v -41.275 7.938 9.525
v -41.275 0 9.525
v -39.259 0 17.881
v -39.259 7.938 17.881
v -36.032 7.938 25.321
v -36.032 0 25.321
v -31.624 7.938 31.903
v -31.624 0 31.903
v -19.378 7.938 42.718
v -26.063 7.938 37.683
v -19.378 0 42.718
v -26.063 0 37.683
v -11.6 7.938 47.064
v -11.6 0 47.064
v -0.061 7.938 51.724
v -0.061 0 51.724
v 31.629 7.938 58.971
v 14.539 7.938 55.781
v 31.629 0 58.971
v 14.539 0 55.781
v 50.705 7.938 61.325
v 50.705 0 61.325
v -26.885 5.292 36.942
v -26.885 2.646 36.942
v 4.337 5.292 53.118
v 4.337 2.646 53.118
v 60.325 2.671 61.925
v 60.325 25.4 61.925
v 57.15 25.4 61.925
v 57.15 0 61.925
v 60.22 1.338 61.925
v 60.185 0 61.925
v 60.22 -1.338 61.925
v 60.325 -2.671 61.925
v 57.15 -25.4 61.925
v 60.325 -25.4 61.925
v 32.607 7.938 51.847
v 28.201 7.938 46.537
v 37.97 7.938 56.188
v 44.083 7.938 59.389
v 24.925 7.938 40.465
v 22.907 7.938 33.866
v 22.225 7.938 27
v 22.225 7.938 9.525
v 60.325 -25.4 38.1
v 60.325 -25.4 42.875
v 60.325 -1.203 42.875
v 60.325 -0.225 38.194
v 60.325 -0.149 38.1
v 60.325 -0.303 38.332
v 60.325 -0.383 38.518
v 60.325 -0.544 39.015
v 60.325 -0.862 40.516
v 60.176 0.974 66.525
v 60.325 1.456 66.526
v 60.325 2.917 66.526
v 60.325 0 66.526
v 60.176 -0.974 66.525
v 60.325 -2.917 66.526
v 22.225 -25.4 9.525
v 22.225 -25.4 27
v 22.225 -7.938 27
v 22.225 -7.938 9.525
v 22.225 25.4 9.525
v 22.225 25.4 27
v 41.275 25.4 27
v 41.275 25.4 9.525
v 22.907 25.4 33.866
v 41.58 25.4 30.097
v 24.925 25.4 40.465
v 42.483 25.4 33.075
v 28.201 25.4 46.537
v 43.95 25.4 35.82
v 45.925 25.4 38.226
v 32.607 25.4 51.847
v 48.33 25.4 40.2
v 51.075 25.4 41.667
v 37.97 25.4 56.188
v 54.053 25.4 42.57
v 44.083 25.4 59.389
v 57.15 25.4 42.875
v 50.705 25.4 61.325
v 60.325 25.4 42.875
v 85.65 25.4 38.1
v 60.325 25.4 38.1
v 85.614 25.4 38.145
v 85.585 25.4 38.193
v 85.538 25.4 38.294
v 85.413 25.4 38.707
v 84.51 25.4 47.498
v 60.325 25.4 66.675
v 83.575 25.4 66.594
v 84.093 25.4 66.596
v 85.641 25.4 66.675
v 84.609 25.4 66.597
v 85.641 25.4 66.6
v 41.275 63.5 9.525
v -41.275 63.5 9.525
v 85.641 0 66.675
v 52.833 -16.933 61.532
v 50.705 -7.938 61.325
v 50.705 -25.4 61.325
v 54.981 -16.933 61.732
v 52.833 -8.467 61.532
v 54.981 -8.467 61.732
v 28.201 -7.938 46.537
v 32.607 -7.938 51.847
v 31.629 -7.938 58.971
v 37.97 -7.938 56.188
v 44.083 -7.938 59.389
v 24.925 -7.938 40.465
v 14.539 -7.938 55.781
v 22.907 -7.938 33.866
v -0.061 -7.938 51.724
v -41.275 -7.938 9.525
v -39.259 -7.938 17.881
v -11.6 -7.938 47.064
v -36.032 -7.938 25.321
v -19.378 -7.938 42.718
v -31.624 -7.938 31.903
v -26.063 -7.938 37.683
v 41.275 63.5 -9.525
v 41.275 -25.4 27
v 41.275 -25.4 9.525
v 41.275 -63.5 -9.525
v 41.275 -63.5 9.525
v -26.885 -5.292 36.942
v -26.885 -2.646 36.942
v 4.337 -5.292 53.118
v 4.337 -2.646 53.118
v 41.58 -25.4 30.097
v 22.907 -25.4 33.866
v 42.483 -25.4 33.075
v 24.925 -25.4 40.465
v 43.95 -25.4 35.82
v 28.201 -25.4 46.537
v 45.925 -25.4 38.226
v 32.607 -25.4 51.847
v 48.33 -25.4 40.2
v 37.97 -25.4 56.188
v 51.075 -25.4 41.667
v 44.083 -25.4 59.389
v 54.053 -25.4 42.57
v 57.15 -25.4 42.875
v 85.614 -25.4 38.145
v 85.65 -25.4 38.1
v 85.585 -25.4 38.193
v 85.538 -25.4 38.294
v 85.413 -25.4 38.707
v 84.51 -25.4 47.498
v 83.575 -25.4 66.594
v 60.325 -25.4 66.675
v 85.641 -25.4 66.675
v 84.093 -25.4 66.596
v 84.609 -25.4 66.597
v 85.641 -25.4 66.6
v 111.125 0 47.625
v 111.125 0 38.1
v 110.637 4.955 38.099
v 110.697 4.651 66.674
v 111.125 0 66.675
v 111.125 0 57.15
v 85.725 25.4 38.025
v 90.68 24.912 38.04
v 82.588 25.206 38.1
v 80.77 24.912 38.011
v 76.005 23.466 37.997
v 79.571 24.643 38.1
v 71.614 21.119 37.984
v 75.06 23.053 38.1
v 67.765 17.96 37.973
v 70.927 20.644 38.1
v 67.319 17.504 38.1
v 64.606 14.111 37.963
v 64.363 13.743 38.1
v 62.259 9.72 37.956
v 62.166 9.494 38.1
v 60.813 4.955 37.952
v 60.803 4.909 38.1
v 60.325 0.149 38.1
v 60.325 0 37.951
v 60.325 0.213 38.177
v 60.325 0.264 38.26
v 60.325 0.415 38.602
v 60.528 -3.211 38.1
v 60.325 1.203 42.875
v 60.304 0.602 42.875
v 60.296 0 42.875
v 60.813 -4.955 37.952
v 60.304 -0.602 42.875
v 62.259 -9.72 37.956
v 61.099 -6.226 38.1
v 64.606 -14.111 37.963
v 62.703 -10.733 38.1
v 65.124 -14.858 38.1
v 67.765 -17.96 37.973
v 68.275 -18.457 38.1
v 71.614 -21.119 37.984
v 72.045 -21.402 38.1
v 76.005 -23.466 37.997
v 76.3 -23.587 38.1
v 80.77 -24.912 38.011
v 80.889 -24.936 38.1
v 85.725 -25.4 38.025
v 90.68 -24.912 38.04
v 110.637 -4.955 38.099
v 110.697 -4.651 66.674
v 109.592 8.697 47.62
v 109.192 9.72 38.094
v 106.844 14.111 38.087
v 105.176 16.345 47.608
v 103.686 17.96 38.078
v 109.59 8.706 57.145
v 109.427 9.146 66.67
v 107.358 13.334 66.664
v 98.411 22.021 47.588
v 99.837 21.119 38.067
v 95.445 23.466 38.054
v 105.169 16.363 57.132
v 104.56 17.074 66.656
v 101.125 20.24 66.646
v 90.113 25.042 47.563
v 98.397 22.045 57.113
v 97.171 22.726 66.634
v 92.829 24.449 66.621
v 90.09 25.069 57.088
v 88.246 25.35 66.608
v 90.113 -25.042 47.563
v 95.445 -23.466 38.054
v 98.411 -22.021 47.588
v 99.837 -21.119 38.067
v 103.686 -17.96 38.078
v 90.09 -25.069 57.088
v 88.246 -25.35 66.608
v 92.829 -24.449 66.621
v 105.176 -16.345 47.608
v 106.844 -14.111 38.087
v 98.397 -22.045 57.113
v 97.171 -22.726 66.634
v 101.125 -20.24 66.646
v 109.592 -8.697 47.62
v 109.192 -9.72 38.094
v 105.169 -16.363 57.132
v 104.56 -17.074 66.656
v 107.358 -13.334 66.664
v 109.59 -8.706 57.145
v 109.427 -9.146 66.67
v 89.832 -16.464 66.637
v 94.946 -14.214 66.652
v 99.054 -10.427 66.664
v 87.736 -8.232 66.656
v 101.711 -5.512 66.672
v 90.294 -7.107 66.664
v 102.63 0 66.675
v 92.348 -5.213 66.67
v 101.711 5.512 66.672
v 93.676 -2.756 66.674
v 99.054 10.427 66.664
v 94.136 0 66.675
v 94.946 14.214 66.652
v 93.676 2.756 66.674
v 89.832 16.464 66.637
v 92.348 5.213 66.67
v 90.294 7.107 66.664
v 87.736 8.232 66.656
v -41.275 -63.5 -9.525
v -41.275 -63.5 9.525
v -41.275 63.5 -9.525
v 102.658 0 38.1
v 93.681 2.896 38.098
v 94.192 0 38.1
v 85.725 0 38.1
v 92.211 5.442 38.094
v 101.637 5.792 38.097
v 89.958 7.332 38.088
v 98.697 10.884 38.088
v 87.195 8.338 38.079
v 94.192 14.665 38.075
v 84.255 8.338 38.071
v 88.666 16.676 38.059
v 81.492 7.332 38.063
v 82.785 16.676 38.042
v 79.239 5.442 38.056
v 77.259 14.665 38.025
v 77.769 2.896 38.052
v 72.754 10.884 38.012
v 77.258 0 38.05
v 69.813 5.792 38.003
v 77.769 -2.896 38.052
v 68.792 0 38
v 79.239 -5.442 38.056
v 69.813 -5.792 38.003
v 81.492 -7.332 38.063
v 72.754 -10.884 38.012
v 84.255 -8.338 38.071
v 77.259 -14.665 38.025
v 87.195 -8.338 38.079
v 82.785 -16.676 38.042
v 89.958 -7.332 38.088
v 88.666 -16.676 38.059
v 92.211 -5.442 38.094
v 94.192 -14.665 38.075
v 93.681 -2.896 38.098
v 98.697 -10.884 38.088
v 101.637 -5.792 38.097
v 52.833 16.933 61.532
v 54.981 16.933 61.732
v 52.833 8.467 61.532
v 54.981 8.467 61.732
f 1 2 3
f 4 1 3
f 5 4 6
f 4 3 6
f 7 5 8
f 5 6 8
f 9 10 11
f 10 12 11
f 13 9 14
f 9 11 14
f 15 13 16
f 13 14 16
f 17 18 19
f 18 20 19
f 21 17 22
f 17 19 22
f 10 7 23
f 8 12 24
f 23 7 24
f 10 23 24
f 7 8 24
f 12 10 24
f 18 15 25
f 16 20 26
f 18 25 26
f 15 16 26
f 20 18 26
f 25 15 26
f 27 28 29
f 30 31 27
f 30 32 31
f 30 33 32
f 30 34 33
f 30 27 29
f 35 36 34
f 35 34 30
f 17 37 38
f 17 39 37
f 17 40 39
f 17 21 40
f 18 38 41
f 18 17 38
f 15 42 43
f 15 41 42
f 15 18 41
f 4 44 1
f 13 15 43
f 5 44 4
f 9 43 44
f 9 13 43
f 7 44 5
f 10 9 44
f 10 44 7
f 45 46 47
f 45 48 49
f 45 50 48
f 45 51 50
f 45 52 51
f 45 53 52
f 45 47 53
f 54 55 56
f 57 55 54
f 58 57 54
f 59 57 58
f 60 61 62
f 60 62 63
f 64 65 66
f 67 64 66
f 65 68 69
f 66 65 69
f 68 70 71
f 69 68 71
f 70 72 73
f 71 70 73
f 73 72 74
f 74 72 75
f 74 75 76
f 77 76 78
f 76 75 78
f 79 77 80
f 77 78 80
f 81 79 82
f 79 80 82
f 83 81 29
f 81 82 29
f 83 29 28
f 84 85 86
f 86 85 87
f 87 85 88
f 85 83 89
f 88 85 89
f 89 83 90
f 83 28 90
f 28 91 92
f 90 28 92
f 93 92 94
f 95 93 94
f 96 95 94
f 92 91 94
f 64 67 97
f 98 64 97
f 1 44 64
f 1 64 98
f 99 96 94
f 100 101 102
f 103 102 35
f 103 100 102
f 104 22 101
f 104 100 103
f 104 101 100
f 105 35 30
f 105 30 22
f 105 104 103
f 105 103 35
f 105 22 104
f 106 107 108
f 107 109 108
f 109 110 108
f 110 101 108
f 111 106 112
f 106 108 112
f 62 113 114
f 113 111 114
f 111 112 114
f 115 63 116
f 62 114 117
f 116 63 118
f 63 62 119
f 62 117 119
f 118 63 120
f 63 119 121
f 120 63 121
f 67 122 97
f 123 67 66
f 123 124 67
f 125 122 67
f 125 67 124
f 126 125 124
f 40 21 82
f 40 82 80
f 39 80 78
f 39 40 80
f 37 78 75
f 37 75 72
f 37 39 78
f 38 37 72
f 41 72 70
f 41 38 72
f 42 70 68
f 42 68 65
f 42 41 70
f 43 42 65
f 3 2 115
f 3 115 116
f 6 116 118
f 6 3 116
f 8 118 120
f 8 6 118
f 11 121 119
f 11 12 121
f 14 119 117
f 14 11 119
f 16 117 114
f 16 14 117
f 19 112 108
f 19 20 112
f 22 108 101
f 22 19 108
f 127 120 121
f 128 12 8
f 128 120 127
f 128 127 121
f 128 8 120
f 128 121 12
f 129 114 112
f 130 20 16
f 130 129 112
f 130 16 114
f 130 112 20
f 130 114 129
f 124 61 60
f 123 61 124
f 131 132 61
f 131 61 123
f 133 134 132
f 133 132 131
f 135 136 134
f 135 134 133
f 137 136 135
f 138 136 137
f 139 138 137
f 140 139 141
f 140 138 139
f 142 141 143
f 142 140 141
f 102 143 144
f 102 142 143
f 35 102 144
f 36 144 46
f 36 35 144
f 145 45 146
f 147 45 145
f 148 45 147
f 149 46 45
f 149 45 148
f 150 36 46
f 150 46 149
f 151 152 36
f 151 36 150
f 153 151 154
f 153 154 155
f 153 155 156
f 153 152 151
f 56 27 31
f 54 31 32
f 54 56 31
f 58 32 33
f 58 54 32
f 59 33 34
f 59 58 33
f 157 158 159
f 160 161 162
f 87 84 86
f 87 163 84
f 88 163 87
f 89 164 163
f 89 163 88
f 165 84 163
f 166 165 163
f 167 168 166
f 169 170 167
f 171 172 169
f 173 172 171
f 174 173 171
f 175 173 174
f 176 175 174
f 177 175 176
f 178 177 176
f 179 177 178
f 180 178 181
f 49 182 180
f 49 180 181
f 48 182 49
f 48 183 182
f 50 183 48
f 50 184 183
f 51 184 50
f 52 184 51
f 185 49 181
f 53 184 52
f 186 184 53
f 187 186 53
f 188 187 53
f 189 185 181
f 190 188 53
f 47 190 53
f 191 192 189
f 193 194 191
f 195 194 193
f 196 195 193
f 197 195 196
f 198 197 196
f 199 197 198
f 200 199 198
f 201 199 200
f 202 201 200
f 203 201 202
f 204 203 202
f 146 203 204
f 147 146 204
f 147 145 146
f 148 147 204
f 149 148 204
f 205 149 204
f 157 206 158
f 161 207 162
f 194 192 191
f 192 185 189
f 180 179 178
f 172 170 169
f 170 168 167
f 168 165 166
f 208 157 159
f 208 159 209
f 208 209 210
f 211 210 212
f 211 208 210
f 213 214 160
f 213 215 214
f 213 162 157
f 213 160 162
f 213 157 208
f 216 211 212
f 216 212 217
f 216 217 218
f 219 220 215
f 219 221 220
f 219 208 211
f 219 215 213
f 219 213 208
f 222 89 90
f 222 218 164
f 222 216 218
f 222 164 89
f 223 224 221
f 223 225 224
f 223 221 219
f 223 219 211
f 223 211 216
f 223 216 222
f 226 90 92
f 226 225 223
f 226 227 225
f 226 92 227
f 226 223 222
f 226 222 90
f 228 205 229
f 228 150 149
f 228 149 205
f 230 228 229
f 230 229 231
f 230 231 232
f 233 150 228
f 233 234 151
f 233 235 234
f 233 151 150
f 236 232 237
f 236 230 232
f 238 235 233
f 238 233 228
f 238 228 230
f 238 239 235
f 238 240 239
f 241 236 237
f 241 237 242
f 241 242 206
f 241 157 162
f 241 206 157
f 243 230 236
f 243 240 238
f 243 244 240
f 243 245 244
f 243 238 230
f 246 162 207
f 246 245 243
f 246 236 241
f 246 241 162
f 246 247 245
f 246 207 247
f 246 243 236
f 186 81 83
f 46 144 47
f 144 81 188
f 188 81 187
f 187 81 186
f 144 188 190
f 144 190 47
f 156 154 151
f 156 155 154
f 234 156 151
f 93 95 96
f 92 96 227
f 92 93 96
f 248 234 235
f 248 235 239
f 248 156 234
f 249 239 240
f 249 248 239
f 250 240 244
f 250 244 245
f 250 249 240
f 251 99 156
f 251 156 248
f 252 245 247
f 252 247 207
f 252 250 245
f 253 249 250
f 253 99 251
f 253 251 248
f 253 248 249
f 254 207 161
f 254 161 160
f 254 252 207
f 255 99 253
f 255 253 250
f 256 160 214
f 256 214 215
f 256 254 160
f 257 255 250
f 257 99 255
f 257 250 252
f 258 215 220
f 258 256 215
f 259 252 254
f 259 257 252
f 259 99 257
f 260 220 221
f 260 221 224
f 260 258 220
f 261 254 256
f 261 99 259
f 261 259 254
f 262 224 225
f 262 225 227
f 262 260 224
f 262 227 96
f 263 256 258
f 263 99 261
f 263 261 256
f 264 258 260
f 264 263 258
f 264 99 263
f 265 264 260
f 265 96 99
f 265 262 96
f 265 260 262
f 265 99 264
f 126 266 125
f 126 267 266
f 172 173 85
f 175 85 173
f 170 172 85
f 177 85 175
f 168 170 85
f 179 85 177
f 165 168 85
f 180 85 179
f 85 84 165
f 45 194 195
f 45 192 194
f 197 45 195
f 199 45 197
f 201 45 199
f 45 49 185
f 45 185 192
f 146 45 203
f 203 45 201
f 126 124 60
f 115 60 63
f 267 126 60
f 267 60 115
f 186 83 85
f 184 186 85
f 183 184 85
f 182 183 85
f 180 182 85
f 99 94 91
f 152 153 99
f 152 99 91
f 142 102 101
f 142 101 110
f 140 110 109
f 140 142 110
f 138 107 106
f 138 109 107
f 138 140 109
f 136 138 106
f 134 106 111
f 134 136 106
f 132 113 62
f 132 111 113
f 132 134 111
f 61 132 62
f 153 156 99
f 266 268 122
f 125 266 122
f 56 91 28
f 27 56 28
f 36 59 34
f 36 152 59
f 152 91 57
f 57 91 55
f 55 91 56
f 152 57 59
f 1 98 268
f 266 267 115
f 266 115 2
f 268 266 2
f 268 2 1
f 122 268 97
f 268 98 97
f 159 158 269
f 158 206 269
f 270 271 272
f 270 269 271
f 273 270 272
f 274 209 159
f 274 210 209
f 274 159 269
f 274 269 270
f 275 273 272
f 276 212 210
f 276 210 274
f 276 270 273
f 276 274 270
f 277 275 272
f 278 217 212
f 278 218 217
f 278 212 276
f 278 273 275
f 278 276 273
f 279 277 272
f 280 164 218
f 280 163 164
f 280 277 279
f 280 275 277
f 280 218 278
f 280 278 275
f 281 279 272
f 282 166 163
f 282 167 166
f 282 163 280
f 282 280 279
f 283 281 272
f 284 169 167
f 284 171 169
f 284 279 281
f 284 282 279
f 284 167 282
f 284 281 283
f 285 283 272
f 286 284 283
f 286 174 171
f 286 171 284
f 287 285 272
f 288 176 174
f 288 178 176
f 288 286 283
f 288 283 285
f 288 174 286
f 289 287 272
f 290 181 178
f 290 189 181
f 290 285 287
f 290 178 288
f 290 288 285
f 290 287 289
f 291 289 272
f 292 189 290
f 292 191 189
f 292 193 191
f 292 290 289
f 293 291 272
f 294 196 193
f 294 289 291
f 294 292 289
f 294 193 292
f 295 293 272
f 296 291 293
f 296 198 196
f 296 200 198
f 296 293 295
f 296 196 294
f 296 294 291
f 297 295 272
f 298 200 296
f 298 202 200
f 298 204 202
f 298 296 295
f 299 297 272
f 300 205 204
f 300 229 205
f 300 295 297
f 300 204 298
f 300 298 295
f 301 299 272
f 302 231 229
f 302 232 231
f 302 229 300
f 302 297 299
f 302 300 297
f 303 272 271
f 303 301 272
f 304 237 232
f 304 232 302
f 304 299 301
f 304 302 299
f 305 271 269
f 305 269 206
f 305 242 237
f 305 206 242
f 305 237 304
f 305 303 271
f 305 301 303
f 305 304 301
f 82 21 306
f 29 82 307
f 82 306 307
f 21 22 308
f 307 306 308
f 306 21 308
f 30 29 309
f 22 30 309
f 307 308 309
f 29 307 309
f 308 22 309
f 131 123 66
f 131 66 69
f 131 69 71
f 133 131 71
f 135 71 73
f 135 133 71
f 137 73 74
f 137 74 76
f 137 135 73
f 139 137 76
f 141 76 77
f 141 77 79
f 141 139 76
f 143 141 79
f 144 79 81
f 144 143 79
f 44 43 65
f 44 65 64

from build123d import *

# Parameters (mm, degrees)
F1_DEPTH = 63.5
F2_DEPTH = 25.4
F3_DEPTH = 7.9375


with BuildPart() as f1:
    # F0 (on Front) → F1 (new body, symmetric)
    with BuildSketch(Plane.XZ):
        Polygon((-41.275, -9.525), (41.275, -9.525), (41.275, 9.525), (22.225, 9.525), (-41.275, 9.525), align=None)
    extrude(amount=F1_DEPTH, both=True)

    # F0 (on Front) → F2 (join, symmetric)
    with BuildSketch(Plane.XZ):
        with BuildLine():
            Line((22.225, 9.525), (41.275, 9.525))
            Line((41.275, 9.525), (41.275, 27.0002))
            ThreePointArc((41.275, 27.0002), (45.9246798487, 38.2255201513), (57.15, 42.8752))
            Line((57.15, 42.8752), (60.325, 42.8752))
            Line((60.325, 42.8752), (60.325, 61.9252))
            Line((60.325, 61.9252), (57.15, 61.9252))
            add(Edge.make_bspline(
                [(50.7054314014, 61.3254554335), (52.822029921, 61.5361395895), (54.9703769796, 61.7357484347), (57.15, 61.9252)],
                knots=[107.251905299, 107.251905299, 107.251905299, 107.251905299, 111.5045361635, 111.5045361635, 111.5045361635, 111.5045361635], degree=3))
            ThreePointArc((50.7054314014, 61.3254554335), (30.2722007662, 49.3013105855), (22.225, 27.0002))
            Line((22.225, 27.0002), (22.225, 9.525))
        make_face()
        Polygon((60.325, 61.9252), (60.325, 42.8752), (60.325, 38.1), (85.725, 38.1), (85.6410190463, 66.675), (60.325, 66.675), align=None)
    extrude(amount=F2_DEPTH, both=True)

    # F0 (on Front) → F3 (join, symmetric)
    with BuildSketch(Plane.XZ):
        with BuildLine():
            add(Edge.make_bspline(
                [(-41.275, 9.525), (-35.8625339524, 43.6539850574), (-2.675459444, 56.0119735297), (50.7054314014, 61.3254554335)],
                knots=[0, 0, 0, 0, 107.251905299, 107.251905299, 107.251905299, 107.251905299], degree=3))
            Line((-41.275, 9.525), (22.225, 9.525))
            Line((22.225, 9.525), (22.225, 27.0002))
            ThreePointArc((22.225, 27.0002), (30.2722007662, 49.3013105855), (50.7054314014, 61.3254554335))
        make_face()
    extrude(amount=F3_DEPTH, both=True)

    # F0 (on Front) → F4 (revolve)
    with BuildSketch(Plane.XZ):
        Polygon((85.6410190463, 66.675), (85.725, 38.1), (111.125, 38.1), (111.125, 66.675), align=None)
    revolve(axis=Axis((85.6830095232, 0, 52.3875), (-0.0029389533, 0, 0.9999956813)))


solid = f1.part
